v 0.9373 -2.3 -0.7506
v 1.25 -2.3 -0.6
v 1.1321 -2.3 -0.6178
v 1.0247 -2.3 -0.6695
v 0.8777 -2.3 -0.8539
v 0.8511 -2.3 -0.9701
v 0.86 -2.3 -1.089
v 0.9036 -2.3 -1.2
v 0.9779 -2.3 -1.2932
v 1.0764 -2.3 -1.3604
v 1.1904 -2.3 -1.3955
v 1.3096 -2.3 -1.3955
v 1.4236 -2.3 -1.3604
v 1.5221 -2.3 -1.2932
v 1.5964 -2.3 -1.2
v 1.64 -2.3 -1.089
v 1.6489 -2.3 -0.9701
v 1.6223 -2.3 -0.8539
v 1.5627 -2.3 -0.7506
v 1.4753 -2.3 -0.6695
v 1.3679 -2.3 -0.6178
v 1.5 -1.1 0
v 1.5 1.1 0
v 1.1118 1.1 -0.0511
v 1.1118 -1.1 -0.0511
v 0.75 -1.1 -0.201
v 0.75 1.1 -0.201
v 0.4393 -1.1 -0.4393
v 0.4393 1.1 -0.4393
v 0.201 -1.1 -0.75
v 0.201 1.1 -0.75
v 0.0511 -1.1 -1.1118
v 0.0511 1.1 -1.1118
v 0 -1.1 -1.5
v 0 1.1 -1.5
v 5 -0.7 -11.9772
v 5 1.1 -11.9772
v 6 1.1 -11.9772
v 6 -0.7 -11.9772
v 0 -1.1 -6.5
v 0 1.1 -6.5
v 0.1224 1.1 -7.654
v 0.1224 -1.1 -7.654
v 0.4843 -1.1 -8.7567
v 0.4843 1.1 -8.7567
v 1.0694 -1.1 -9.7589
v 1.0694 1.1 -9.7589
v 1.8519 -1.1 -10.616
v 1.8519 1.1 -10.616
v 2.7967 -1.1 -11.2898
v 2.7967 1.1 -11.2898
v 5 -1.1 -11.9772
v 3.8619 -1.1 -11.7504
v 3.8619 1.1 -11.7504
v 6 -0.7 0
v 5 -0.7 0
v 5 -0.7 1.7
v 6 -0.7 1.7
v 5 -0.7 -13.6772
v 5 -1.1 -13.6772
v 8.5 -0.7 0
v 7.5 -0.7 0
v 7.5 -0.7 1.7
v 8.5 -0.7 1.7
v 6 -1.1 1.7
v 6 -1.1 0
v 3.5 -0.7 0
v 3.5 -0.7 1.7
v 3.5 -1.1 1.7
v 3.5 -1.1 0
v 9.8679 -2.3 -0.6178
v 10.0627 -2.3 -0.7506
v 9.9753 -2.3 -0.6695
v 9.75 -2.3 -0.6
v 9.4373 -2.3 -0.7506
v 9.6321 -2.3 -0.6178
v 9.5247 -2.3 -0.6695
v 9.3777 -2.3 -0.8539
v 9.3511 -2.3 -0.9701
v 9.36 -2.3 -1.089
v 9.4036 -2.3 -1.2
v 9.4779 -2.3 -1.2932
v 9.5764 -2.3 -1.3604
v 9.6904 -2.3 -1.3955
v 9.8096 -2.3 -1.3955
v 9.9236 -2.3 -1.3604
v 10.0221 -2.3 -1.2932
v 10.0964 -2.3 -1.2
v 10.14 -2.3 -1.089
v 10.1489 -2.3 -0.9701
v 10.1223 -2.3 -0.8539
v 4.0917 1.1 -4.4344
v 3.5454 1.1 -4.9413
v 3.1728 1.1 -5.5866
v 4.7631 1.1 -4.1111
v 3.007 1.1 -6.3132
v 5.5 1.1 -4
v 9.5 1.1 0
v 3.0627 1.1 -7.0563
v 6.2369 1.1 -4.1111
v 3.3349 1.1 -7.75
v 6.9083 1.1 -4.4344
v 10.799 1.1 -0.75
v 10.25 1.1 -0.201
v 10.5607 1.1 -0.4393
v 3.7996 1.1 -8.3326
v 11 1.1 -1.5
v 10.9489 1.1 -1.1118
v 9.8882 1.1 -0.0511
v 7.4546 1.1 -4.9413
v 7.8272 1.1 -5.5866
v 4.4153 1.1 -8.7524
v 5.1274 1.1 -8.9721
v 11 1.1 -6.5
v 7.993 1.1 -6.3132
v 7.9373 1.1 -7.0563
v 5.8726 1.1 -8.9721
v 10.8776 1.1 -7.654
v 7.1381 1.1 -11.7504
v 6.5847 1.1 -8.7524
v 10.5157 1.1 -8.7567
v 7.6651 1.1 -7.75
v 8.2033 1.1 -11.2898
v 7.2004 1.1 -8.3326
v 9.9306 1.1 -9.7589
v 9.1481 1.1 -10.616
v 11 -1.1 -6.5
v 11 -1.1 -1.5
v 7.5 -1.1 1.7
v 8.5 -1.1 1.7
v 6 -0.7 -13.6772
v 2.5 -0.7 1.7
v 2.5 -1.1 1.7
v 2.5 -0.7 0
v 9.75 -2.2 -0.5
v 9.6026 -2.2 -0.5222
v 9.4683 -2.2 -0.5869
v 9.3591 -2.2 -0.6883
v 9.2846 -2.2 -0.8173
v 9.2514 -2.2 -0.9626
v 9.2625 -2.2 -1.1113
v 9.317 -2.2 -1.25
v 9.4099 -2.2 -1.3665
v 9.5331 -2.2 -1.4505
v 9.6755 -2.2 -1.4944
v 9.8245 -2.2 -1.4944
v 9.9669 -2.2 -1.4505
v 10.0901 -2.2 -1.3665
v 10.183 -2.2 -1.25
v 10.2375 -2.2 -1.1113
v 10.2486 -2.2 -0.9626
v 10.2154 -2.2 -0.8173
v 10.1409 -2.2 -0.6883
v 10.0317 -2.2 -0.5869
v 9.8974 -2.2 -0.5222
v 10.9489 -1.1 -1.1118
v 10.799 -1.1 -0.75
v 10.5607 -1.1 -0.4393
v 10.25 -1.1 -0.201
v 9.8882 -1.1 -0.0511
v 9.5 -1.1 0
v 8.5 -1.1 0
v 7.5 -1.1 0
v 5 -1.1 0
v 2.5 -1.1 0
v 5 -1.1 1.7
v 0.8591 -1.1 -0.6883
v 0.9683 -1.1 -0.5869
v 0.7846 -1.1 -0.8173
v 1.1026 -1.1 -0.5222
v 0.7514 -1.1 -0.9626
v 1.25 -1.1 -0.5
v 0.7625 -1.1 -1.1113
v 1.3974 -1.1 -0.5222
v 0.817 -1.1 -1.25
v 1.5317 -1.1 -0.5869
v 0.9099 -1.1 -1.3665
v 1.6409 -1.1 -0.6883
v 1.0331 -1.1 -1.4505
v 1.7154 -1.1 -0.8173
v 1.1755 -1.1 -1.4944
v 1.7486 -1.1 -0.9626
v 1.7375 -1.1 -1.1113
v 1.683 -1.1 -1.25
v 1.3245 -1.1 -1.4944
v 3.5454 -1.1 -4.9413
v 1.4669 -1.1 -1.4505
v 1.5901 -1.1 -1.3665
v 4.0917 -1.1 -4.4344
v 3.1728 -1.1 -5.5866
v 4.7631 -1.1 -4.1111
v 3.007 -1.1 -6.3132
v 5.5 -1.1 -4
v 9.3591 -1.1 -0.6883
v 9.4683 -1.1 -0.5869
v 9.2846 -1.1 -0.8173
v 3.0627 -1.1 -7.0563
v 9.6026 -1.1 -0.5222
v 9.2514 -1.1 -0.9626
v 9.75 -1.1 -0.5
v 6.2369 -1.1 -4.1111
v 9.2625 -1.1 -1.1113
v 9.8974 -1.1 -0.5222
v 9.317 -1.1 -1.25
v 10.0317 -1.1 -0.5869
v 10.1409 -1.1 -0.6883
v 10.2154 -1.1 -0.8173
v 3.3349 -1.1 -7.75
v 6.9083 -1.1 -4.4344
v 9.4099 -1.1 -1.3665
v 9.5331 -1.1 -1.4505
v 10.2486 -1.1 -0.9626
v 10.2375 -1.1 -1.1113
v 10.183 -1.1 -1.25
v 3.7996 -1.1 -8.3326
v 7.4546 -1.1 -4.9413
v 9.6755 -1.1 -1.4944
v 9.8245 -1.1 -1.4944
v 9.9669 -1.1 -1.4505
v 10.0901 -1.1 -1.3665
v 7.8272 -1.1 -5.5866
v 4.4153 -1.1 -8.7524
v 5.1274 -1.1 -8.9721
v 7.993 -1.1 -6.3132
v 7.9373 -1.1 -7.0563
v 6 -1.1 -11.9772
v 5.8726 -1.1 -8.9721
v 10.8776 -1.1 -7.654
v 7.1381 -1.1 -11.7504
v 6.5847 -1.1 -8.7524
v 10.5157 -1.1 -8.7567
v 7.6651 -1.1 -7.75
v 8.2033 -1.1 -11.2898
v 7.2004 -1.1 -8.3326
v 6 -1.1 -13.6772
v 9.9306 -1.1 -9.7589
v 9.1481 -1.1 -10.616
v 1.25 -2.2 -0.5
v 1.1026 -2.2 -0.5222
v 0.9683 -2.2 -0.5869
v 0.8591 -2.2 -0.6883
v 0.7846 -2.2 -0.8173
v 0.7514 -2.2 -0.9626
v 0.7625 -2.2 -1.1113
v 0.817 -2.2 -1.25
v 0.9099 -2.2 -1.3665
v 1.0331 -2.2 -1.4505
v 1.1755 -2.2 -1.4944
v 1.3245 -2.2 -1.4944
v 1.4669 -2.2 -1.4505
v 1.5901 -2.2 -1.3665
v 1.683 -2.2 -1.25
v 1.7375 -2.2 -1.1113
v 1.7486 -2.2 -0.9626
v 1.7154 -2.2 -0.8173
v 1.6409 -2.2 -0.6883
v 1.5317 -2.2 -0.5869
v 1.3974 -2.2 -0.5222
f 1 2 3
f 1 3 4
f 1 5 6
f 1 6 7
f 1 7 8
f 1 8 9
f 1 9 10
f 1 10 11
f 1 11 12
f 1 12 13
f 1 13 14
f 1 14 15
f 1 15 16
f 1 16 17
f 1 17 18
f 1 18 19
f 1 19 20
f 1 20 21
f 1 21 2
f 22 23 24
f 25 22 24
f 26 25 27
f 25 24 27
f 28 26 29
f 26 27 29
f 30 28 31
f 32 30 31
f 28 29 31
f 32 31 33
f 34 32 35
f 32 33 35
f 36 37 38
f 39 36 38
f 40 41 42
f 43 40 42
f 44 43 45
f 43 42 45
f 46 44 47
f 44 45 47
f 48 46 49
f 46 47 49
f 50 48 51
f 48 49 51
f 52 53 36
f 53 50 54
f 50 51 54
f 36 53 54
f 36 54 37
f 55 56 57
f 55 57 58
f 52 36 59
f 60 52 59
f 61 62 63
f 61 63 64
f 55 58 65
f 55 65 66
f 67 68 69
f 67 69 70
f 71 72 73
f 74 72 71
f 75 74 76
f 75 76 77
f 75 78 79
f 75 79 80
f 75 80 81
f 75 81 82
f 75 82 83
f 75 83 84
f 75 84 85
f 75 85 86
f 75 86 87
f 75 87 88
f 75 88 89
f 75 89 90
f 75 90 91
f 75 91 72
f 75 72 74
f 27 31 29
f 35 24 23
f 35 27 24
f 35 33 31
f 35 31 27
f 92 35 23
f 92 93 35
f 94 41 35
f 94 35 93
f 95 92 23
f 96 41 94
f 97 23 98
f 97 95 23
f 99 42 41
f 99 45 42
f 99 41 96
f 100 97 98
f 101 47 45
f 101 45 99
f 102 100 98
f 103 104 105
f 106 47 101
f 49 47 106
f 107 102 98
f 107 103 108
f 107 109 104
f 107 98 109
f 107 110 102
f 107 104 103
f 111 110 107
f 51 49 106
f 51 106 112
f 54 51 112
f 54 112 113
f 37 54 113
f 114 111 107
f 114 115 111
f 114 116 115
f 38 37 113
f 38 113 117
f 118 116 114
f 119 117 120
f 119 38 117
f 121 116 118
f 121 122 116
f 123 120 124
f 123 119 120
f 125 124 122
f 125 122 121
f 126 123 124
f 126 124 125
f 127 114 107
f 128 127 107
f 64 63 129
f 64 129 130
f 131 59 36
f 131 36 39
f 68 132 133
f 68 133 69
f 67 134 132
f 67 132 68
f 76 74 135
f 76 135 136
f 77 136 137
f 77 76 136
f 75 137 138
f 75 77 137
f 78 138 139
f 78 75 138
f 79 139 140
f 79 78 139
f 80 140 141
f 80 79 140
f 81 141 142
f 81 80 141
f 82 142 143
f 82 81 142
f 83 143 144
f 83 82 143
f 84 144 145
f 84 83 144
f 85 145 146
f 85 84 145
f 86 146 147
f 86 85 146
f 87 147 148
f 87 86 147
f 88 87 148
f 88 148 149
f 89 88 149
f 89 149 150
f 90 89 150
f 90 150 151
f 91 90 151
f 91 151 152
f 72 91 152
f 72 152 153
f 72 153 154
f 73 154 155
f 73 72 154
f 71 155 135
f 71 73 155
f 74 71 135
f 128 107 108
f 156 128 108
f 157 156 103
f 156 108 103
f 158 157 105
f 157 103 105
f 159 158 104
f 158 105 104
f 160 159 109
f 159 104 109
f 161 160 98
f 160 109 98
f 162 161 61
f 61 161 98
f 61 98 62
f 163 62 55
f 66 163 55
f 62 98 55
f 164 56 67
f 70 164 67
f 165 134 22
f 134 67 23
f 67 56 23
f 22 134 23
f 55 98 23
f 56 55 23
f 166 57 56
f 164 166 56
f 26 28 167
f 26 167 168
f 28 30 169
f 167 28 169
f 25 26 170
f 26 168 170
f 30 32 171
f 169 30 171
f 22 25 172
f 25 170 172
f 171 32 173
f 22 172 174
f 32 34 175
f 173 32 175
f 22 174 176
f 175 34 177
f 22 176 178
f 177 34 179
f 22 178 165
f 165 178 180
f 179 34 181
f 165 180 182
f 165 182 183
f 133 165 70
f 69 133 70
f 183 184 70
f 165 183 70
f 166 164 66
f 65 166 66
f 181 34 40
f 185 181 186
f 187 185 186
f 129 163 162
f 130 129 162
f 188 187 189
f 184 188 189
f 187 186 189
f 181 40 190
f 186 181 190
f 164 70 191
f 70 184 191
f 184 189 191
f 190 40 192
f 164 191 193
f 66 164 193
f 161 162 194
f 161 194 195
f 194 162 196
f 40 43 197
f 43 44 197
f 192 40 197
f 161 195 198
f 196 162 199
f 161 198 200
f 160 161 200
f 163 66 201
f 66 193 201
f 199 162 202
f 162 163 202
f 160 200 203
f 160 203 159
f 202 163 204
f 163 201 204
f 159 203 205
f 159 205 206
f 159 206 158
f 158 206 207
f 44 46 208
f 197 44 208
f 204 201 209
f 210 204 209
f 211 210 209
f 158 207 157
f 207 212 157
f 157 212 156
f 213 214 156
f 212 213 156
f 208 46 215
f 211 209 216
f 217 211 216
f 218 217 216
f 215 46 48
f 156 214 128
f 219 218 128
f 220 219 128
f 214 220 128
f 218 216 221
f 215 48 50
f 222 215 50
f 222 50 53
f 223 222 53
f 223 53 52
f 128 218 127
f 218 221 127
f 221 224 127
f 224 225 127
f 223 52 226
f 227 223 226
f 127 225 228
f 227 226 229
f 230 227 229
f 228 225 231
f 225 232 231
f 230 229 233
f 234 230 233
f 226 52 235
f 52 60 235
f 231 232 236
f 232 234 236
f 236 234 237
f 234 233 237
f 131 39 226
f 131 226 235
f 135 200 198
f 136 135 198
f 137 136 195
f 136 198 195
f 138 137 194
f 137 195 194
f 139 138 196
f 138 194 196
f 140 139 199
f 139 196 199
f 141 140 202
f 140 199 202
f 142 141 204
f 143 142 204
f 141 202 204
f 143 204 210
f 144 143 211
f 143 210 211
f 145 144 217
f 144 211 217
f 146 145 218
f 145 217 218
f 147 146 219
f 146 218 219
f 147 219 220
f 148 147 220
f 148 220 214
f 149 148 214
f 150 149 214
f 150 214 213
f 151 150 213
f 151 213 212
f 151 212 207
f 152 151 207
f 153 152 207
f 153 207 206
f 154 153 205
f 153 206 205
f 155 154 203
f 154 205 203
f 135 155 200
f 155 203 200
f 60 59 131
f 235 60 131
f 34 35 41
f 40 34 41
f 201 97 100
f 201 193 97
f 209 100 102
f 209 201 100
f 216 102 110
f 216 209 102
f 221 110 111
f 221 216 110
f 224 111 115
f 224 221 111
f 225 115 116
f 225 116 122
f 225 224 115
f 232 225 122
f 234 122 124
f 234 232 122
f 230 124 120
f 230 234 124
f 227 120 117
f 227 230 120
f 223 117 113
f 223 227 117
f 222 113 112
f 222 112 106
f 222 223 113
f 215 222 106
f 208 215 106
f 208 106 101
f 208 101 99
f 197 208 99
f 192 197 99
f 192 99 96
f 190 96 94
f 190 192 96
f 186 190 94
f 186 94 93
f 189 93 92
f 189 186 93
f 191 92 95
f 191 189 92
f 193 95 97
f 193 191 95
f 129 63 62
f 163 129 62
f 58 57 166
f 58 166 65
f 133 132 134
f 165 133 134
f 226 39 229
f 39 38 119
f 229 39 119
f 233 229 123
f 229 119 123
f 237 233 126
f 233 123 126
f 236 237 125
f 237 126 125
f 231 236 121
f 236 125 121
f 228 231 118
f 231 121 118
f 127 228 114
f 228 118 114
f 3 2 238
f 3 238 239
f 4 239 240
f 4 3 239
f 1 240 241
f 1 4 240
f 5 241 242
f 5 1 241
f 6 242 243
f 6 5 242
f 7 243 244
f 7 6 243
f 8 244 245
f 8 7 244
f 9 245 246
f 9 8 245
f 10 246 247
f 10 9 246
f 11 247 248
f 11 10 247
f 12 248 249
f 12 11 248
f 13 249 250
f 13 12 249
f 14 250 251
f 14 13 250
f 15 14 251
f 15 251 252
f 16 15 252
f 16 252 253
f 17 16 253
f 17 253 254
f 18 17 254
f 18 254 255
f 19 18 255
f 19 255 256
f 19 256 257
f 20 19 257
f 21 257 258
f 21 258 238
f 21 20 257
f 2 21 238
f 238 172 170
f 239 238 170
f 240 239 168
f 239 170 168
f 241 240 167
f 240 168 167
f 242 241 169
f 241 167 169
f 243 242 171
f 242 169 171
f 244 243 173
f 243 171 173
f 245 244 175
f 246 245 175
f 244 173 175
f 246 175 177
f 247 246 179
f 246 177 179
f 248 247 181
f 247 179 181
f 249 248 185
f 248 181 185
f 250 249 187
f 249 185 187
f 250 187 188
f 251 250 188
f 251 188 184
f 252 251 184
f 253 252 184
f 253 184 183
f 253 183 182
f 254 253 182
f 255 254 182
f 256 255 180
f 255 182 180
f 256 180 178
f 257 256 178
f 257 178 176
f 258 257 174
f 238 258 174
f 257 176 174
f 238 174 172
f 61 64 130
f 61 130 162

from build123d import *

# Parameters (mm, degrees)
SKETCH_1_R          = 2.5
SKETCH_1_W          = 1
SKETCH_1_H          = 1.7
EXTRUDE_1_DEPTH     = 1.1
SKETCH_2_W          = 1
SKETCH_2_H          = 1.7
CUT_EXTRUDE_1_DEPTH = 1.8
SKETCH_3_R          = 0.5
EXTRUDE_2_DEPTH     = 1.2
CHAMFER_1_SIZE      = 0.1


with BuildPart() as part:
    # 草图1 → 凸台-拉伸1 (new, symmetric)
    # profile 1 of 5: a face of its own
    with BuildSketch(Plane(origin=(0, 0, 0), x_dir=(1, 0, 0), z_dir=(0, 1, 0))):
        with BuildLine():
            Line((0, 1.5), (0, 6.5))
            ThreePointArc((0, 6.5), (5.5, 12), (11, 6.5))
            Line((11, 6.5), (11, 1.5))
            ThreePointArc((11, 1.5), (10.560660172, 0.439339828), (9.5, 0))
            Line((9.5, 0), (1.5, 0))
            ThreePointArc((1.5, 0), (0.439339828, 0.439339828), (0, 1.5))
        make_face()
        with Locations(Location((5.5, 6.5, 0), (0, 0, 270))):
            Circle(SKETCH_1_R, mode=Mode.SUBTRACT)
    # profile 2 of 5: a face of its own
    with BuildSketch(Plane(origin=(0, 0, 0), x_dir=(1, 0, 0), z_dir=(0, 1, 0))):
        with Locations((3, -0.85)):
            Rectangle(SKETCH_1_W, SKETCH_1_H)
    # profile 3 of 5: a face of its own
    with BuildSketch(Plane(origin=(0, 0, 0), x_dir=(1, 0, 0), z_dir=(0, 1, 0))):
        with Locations((5.5, -0.85)):
            Rectangle(SKETCH_1_W, SKETCH_1_H)
    # profile 4 of 5: a face of its own
    with BuildSketch(Plane(origin=(0, 0, 0), x_dir=(1, 0, 0), z_dir=(0, 1, 0))):
        with Locations((8, -0.85)):
            Rectangle(SKETCH_1_W, SKETCH_1_H)
    # profile 5 of 5: a face of its own
    with BuildSketch(Plane(origin=(0, 0, 0), x_dir=(1, 0, 0), z_dir=(0, 1, 0))):
        with Locations((5.5, 12.827225575)):
            Rectangle(SKETCH_1_W, SKETCH_1_H)
    extrude(amount=EXTRUDE_1_DEPTH, both=True)

    # 草图2 → 切除-拉伸1 (cut)
    with BuildSketch(Plane(origin=(0, 1.1, 0), x_dir=(1, 0, 0), z_dir=(0, 1, 0))):
        with Locations((5.5, 12.827225575)):
            Rectangle(SKETCH_2_W, SKETCH_2_H)
        with Locations((3, -0.85)):
            Rectangle(SKETCH_2_W, SKETCH_2_H)
        with Locations((5.5, -0.85)):
            Rectangle(SKETCH_2_W, SKETCH_2_H)
        with Locations((8, -0.85)):
            Rectangle(SKETCH_2_W, SKETCH_2_H)
    extrude(amount=-CUT_EXTRUDE_1_DEPTH, mode=Mode.SUBTRACT)

    # 草图3 → 凸台-拉伸2 (add)
    with BuildSketch(Plane.XZ.offset(1.1)):
        with Locations(Location((1.25, -1, 0), (0, 0, 90))):
            Circle(SKETCH_3_R)
        with Locations(Location((9.75, -1, 0), (0, 0, 90))):
            Circle(SKETCH_3_R)
    extrude(amount=EXTRUDE_2_DEPTH)

    # 倒角1
    chamfer_1_edges = [part.edges().sort_by_distance(p)[0] for p in [
        (1.25, -2.3, -1.5),
        (9.75, -2.3, -1.5),
    ]]
    chamfer(chamfer_1_edges, length=CHAMFER_1_SIZE)


solid = part.part
